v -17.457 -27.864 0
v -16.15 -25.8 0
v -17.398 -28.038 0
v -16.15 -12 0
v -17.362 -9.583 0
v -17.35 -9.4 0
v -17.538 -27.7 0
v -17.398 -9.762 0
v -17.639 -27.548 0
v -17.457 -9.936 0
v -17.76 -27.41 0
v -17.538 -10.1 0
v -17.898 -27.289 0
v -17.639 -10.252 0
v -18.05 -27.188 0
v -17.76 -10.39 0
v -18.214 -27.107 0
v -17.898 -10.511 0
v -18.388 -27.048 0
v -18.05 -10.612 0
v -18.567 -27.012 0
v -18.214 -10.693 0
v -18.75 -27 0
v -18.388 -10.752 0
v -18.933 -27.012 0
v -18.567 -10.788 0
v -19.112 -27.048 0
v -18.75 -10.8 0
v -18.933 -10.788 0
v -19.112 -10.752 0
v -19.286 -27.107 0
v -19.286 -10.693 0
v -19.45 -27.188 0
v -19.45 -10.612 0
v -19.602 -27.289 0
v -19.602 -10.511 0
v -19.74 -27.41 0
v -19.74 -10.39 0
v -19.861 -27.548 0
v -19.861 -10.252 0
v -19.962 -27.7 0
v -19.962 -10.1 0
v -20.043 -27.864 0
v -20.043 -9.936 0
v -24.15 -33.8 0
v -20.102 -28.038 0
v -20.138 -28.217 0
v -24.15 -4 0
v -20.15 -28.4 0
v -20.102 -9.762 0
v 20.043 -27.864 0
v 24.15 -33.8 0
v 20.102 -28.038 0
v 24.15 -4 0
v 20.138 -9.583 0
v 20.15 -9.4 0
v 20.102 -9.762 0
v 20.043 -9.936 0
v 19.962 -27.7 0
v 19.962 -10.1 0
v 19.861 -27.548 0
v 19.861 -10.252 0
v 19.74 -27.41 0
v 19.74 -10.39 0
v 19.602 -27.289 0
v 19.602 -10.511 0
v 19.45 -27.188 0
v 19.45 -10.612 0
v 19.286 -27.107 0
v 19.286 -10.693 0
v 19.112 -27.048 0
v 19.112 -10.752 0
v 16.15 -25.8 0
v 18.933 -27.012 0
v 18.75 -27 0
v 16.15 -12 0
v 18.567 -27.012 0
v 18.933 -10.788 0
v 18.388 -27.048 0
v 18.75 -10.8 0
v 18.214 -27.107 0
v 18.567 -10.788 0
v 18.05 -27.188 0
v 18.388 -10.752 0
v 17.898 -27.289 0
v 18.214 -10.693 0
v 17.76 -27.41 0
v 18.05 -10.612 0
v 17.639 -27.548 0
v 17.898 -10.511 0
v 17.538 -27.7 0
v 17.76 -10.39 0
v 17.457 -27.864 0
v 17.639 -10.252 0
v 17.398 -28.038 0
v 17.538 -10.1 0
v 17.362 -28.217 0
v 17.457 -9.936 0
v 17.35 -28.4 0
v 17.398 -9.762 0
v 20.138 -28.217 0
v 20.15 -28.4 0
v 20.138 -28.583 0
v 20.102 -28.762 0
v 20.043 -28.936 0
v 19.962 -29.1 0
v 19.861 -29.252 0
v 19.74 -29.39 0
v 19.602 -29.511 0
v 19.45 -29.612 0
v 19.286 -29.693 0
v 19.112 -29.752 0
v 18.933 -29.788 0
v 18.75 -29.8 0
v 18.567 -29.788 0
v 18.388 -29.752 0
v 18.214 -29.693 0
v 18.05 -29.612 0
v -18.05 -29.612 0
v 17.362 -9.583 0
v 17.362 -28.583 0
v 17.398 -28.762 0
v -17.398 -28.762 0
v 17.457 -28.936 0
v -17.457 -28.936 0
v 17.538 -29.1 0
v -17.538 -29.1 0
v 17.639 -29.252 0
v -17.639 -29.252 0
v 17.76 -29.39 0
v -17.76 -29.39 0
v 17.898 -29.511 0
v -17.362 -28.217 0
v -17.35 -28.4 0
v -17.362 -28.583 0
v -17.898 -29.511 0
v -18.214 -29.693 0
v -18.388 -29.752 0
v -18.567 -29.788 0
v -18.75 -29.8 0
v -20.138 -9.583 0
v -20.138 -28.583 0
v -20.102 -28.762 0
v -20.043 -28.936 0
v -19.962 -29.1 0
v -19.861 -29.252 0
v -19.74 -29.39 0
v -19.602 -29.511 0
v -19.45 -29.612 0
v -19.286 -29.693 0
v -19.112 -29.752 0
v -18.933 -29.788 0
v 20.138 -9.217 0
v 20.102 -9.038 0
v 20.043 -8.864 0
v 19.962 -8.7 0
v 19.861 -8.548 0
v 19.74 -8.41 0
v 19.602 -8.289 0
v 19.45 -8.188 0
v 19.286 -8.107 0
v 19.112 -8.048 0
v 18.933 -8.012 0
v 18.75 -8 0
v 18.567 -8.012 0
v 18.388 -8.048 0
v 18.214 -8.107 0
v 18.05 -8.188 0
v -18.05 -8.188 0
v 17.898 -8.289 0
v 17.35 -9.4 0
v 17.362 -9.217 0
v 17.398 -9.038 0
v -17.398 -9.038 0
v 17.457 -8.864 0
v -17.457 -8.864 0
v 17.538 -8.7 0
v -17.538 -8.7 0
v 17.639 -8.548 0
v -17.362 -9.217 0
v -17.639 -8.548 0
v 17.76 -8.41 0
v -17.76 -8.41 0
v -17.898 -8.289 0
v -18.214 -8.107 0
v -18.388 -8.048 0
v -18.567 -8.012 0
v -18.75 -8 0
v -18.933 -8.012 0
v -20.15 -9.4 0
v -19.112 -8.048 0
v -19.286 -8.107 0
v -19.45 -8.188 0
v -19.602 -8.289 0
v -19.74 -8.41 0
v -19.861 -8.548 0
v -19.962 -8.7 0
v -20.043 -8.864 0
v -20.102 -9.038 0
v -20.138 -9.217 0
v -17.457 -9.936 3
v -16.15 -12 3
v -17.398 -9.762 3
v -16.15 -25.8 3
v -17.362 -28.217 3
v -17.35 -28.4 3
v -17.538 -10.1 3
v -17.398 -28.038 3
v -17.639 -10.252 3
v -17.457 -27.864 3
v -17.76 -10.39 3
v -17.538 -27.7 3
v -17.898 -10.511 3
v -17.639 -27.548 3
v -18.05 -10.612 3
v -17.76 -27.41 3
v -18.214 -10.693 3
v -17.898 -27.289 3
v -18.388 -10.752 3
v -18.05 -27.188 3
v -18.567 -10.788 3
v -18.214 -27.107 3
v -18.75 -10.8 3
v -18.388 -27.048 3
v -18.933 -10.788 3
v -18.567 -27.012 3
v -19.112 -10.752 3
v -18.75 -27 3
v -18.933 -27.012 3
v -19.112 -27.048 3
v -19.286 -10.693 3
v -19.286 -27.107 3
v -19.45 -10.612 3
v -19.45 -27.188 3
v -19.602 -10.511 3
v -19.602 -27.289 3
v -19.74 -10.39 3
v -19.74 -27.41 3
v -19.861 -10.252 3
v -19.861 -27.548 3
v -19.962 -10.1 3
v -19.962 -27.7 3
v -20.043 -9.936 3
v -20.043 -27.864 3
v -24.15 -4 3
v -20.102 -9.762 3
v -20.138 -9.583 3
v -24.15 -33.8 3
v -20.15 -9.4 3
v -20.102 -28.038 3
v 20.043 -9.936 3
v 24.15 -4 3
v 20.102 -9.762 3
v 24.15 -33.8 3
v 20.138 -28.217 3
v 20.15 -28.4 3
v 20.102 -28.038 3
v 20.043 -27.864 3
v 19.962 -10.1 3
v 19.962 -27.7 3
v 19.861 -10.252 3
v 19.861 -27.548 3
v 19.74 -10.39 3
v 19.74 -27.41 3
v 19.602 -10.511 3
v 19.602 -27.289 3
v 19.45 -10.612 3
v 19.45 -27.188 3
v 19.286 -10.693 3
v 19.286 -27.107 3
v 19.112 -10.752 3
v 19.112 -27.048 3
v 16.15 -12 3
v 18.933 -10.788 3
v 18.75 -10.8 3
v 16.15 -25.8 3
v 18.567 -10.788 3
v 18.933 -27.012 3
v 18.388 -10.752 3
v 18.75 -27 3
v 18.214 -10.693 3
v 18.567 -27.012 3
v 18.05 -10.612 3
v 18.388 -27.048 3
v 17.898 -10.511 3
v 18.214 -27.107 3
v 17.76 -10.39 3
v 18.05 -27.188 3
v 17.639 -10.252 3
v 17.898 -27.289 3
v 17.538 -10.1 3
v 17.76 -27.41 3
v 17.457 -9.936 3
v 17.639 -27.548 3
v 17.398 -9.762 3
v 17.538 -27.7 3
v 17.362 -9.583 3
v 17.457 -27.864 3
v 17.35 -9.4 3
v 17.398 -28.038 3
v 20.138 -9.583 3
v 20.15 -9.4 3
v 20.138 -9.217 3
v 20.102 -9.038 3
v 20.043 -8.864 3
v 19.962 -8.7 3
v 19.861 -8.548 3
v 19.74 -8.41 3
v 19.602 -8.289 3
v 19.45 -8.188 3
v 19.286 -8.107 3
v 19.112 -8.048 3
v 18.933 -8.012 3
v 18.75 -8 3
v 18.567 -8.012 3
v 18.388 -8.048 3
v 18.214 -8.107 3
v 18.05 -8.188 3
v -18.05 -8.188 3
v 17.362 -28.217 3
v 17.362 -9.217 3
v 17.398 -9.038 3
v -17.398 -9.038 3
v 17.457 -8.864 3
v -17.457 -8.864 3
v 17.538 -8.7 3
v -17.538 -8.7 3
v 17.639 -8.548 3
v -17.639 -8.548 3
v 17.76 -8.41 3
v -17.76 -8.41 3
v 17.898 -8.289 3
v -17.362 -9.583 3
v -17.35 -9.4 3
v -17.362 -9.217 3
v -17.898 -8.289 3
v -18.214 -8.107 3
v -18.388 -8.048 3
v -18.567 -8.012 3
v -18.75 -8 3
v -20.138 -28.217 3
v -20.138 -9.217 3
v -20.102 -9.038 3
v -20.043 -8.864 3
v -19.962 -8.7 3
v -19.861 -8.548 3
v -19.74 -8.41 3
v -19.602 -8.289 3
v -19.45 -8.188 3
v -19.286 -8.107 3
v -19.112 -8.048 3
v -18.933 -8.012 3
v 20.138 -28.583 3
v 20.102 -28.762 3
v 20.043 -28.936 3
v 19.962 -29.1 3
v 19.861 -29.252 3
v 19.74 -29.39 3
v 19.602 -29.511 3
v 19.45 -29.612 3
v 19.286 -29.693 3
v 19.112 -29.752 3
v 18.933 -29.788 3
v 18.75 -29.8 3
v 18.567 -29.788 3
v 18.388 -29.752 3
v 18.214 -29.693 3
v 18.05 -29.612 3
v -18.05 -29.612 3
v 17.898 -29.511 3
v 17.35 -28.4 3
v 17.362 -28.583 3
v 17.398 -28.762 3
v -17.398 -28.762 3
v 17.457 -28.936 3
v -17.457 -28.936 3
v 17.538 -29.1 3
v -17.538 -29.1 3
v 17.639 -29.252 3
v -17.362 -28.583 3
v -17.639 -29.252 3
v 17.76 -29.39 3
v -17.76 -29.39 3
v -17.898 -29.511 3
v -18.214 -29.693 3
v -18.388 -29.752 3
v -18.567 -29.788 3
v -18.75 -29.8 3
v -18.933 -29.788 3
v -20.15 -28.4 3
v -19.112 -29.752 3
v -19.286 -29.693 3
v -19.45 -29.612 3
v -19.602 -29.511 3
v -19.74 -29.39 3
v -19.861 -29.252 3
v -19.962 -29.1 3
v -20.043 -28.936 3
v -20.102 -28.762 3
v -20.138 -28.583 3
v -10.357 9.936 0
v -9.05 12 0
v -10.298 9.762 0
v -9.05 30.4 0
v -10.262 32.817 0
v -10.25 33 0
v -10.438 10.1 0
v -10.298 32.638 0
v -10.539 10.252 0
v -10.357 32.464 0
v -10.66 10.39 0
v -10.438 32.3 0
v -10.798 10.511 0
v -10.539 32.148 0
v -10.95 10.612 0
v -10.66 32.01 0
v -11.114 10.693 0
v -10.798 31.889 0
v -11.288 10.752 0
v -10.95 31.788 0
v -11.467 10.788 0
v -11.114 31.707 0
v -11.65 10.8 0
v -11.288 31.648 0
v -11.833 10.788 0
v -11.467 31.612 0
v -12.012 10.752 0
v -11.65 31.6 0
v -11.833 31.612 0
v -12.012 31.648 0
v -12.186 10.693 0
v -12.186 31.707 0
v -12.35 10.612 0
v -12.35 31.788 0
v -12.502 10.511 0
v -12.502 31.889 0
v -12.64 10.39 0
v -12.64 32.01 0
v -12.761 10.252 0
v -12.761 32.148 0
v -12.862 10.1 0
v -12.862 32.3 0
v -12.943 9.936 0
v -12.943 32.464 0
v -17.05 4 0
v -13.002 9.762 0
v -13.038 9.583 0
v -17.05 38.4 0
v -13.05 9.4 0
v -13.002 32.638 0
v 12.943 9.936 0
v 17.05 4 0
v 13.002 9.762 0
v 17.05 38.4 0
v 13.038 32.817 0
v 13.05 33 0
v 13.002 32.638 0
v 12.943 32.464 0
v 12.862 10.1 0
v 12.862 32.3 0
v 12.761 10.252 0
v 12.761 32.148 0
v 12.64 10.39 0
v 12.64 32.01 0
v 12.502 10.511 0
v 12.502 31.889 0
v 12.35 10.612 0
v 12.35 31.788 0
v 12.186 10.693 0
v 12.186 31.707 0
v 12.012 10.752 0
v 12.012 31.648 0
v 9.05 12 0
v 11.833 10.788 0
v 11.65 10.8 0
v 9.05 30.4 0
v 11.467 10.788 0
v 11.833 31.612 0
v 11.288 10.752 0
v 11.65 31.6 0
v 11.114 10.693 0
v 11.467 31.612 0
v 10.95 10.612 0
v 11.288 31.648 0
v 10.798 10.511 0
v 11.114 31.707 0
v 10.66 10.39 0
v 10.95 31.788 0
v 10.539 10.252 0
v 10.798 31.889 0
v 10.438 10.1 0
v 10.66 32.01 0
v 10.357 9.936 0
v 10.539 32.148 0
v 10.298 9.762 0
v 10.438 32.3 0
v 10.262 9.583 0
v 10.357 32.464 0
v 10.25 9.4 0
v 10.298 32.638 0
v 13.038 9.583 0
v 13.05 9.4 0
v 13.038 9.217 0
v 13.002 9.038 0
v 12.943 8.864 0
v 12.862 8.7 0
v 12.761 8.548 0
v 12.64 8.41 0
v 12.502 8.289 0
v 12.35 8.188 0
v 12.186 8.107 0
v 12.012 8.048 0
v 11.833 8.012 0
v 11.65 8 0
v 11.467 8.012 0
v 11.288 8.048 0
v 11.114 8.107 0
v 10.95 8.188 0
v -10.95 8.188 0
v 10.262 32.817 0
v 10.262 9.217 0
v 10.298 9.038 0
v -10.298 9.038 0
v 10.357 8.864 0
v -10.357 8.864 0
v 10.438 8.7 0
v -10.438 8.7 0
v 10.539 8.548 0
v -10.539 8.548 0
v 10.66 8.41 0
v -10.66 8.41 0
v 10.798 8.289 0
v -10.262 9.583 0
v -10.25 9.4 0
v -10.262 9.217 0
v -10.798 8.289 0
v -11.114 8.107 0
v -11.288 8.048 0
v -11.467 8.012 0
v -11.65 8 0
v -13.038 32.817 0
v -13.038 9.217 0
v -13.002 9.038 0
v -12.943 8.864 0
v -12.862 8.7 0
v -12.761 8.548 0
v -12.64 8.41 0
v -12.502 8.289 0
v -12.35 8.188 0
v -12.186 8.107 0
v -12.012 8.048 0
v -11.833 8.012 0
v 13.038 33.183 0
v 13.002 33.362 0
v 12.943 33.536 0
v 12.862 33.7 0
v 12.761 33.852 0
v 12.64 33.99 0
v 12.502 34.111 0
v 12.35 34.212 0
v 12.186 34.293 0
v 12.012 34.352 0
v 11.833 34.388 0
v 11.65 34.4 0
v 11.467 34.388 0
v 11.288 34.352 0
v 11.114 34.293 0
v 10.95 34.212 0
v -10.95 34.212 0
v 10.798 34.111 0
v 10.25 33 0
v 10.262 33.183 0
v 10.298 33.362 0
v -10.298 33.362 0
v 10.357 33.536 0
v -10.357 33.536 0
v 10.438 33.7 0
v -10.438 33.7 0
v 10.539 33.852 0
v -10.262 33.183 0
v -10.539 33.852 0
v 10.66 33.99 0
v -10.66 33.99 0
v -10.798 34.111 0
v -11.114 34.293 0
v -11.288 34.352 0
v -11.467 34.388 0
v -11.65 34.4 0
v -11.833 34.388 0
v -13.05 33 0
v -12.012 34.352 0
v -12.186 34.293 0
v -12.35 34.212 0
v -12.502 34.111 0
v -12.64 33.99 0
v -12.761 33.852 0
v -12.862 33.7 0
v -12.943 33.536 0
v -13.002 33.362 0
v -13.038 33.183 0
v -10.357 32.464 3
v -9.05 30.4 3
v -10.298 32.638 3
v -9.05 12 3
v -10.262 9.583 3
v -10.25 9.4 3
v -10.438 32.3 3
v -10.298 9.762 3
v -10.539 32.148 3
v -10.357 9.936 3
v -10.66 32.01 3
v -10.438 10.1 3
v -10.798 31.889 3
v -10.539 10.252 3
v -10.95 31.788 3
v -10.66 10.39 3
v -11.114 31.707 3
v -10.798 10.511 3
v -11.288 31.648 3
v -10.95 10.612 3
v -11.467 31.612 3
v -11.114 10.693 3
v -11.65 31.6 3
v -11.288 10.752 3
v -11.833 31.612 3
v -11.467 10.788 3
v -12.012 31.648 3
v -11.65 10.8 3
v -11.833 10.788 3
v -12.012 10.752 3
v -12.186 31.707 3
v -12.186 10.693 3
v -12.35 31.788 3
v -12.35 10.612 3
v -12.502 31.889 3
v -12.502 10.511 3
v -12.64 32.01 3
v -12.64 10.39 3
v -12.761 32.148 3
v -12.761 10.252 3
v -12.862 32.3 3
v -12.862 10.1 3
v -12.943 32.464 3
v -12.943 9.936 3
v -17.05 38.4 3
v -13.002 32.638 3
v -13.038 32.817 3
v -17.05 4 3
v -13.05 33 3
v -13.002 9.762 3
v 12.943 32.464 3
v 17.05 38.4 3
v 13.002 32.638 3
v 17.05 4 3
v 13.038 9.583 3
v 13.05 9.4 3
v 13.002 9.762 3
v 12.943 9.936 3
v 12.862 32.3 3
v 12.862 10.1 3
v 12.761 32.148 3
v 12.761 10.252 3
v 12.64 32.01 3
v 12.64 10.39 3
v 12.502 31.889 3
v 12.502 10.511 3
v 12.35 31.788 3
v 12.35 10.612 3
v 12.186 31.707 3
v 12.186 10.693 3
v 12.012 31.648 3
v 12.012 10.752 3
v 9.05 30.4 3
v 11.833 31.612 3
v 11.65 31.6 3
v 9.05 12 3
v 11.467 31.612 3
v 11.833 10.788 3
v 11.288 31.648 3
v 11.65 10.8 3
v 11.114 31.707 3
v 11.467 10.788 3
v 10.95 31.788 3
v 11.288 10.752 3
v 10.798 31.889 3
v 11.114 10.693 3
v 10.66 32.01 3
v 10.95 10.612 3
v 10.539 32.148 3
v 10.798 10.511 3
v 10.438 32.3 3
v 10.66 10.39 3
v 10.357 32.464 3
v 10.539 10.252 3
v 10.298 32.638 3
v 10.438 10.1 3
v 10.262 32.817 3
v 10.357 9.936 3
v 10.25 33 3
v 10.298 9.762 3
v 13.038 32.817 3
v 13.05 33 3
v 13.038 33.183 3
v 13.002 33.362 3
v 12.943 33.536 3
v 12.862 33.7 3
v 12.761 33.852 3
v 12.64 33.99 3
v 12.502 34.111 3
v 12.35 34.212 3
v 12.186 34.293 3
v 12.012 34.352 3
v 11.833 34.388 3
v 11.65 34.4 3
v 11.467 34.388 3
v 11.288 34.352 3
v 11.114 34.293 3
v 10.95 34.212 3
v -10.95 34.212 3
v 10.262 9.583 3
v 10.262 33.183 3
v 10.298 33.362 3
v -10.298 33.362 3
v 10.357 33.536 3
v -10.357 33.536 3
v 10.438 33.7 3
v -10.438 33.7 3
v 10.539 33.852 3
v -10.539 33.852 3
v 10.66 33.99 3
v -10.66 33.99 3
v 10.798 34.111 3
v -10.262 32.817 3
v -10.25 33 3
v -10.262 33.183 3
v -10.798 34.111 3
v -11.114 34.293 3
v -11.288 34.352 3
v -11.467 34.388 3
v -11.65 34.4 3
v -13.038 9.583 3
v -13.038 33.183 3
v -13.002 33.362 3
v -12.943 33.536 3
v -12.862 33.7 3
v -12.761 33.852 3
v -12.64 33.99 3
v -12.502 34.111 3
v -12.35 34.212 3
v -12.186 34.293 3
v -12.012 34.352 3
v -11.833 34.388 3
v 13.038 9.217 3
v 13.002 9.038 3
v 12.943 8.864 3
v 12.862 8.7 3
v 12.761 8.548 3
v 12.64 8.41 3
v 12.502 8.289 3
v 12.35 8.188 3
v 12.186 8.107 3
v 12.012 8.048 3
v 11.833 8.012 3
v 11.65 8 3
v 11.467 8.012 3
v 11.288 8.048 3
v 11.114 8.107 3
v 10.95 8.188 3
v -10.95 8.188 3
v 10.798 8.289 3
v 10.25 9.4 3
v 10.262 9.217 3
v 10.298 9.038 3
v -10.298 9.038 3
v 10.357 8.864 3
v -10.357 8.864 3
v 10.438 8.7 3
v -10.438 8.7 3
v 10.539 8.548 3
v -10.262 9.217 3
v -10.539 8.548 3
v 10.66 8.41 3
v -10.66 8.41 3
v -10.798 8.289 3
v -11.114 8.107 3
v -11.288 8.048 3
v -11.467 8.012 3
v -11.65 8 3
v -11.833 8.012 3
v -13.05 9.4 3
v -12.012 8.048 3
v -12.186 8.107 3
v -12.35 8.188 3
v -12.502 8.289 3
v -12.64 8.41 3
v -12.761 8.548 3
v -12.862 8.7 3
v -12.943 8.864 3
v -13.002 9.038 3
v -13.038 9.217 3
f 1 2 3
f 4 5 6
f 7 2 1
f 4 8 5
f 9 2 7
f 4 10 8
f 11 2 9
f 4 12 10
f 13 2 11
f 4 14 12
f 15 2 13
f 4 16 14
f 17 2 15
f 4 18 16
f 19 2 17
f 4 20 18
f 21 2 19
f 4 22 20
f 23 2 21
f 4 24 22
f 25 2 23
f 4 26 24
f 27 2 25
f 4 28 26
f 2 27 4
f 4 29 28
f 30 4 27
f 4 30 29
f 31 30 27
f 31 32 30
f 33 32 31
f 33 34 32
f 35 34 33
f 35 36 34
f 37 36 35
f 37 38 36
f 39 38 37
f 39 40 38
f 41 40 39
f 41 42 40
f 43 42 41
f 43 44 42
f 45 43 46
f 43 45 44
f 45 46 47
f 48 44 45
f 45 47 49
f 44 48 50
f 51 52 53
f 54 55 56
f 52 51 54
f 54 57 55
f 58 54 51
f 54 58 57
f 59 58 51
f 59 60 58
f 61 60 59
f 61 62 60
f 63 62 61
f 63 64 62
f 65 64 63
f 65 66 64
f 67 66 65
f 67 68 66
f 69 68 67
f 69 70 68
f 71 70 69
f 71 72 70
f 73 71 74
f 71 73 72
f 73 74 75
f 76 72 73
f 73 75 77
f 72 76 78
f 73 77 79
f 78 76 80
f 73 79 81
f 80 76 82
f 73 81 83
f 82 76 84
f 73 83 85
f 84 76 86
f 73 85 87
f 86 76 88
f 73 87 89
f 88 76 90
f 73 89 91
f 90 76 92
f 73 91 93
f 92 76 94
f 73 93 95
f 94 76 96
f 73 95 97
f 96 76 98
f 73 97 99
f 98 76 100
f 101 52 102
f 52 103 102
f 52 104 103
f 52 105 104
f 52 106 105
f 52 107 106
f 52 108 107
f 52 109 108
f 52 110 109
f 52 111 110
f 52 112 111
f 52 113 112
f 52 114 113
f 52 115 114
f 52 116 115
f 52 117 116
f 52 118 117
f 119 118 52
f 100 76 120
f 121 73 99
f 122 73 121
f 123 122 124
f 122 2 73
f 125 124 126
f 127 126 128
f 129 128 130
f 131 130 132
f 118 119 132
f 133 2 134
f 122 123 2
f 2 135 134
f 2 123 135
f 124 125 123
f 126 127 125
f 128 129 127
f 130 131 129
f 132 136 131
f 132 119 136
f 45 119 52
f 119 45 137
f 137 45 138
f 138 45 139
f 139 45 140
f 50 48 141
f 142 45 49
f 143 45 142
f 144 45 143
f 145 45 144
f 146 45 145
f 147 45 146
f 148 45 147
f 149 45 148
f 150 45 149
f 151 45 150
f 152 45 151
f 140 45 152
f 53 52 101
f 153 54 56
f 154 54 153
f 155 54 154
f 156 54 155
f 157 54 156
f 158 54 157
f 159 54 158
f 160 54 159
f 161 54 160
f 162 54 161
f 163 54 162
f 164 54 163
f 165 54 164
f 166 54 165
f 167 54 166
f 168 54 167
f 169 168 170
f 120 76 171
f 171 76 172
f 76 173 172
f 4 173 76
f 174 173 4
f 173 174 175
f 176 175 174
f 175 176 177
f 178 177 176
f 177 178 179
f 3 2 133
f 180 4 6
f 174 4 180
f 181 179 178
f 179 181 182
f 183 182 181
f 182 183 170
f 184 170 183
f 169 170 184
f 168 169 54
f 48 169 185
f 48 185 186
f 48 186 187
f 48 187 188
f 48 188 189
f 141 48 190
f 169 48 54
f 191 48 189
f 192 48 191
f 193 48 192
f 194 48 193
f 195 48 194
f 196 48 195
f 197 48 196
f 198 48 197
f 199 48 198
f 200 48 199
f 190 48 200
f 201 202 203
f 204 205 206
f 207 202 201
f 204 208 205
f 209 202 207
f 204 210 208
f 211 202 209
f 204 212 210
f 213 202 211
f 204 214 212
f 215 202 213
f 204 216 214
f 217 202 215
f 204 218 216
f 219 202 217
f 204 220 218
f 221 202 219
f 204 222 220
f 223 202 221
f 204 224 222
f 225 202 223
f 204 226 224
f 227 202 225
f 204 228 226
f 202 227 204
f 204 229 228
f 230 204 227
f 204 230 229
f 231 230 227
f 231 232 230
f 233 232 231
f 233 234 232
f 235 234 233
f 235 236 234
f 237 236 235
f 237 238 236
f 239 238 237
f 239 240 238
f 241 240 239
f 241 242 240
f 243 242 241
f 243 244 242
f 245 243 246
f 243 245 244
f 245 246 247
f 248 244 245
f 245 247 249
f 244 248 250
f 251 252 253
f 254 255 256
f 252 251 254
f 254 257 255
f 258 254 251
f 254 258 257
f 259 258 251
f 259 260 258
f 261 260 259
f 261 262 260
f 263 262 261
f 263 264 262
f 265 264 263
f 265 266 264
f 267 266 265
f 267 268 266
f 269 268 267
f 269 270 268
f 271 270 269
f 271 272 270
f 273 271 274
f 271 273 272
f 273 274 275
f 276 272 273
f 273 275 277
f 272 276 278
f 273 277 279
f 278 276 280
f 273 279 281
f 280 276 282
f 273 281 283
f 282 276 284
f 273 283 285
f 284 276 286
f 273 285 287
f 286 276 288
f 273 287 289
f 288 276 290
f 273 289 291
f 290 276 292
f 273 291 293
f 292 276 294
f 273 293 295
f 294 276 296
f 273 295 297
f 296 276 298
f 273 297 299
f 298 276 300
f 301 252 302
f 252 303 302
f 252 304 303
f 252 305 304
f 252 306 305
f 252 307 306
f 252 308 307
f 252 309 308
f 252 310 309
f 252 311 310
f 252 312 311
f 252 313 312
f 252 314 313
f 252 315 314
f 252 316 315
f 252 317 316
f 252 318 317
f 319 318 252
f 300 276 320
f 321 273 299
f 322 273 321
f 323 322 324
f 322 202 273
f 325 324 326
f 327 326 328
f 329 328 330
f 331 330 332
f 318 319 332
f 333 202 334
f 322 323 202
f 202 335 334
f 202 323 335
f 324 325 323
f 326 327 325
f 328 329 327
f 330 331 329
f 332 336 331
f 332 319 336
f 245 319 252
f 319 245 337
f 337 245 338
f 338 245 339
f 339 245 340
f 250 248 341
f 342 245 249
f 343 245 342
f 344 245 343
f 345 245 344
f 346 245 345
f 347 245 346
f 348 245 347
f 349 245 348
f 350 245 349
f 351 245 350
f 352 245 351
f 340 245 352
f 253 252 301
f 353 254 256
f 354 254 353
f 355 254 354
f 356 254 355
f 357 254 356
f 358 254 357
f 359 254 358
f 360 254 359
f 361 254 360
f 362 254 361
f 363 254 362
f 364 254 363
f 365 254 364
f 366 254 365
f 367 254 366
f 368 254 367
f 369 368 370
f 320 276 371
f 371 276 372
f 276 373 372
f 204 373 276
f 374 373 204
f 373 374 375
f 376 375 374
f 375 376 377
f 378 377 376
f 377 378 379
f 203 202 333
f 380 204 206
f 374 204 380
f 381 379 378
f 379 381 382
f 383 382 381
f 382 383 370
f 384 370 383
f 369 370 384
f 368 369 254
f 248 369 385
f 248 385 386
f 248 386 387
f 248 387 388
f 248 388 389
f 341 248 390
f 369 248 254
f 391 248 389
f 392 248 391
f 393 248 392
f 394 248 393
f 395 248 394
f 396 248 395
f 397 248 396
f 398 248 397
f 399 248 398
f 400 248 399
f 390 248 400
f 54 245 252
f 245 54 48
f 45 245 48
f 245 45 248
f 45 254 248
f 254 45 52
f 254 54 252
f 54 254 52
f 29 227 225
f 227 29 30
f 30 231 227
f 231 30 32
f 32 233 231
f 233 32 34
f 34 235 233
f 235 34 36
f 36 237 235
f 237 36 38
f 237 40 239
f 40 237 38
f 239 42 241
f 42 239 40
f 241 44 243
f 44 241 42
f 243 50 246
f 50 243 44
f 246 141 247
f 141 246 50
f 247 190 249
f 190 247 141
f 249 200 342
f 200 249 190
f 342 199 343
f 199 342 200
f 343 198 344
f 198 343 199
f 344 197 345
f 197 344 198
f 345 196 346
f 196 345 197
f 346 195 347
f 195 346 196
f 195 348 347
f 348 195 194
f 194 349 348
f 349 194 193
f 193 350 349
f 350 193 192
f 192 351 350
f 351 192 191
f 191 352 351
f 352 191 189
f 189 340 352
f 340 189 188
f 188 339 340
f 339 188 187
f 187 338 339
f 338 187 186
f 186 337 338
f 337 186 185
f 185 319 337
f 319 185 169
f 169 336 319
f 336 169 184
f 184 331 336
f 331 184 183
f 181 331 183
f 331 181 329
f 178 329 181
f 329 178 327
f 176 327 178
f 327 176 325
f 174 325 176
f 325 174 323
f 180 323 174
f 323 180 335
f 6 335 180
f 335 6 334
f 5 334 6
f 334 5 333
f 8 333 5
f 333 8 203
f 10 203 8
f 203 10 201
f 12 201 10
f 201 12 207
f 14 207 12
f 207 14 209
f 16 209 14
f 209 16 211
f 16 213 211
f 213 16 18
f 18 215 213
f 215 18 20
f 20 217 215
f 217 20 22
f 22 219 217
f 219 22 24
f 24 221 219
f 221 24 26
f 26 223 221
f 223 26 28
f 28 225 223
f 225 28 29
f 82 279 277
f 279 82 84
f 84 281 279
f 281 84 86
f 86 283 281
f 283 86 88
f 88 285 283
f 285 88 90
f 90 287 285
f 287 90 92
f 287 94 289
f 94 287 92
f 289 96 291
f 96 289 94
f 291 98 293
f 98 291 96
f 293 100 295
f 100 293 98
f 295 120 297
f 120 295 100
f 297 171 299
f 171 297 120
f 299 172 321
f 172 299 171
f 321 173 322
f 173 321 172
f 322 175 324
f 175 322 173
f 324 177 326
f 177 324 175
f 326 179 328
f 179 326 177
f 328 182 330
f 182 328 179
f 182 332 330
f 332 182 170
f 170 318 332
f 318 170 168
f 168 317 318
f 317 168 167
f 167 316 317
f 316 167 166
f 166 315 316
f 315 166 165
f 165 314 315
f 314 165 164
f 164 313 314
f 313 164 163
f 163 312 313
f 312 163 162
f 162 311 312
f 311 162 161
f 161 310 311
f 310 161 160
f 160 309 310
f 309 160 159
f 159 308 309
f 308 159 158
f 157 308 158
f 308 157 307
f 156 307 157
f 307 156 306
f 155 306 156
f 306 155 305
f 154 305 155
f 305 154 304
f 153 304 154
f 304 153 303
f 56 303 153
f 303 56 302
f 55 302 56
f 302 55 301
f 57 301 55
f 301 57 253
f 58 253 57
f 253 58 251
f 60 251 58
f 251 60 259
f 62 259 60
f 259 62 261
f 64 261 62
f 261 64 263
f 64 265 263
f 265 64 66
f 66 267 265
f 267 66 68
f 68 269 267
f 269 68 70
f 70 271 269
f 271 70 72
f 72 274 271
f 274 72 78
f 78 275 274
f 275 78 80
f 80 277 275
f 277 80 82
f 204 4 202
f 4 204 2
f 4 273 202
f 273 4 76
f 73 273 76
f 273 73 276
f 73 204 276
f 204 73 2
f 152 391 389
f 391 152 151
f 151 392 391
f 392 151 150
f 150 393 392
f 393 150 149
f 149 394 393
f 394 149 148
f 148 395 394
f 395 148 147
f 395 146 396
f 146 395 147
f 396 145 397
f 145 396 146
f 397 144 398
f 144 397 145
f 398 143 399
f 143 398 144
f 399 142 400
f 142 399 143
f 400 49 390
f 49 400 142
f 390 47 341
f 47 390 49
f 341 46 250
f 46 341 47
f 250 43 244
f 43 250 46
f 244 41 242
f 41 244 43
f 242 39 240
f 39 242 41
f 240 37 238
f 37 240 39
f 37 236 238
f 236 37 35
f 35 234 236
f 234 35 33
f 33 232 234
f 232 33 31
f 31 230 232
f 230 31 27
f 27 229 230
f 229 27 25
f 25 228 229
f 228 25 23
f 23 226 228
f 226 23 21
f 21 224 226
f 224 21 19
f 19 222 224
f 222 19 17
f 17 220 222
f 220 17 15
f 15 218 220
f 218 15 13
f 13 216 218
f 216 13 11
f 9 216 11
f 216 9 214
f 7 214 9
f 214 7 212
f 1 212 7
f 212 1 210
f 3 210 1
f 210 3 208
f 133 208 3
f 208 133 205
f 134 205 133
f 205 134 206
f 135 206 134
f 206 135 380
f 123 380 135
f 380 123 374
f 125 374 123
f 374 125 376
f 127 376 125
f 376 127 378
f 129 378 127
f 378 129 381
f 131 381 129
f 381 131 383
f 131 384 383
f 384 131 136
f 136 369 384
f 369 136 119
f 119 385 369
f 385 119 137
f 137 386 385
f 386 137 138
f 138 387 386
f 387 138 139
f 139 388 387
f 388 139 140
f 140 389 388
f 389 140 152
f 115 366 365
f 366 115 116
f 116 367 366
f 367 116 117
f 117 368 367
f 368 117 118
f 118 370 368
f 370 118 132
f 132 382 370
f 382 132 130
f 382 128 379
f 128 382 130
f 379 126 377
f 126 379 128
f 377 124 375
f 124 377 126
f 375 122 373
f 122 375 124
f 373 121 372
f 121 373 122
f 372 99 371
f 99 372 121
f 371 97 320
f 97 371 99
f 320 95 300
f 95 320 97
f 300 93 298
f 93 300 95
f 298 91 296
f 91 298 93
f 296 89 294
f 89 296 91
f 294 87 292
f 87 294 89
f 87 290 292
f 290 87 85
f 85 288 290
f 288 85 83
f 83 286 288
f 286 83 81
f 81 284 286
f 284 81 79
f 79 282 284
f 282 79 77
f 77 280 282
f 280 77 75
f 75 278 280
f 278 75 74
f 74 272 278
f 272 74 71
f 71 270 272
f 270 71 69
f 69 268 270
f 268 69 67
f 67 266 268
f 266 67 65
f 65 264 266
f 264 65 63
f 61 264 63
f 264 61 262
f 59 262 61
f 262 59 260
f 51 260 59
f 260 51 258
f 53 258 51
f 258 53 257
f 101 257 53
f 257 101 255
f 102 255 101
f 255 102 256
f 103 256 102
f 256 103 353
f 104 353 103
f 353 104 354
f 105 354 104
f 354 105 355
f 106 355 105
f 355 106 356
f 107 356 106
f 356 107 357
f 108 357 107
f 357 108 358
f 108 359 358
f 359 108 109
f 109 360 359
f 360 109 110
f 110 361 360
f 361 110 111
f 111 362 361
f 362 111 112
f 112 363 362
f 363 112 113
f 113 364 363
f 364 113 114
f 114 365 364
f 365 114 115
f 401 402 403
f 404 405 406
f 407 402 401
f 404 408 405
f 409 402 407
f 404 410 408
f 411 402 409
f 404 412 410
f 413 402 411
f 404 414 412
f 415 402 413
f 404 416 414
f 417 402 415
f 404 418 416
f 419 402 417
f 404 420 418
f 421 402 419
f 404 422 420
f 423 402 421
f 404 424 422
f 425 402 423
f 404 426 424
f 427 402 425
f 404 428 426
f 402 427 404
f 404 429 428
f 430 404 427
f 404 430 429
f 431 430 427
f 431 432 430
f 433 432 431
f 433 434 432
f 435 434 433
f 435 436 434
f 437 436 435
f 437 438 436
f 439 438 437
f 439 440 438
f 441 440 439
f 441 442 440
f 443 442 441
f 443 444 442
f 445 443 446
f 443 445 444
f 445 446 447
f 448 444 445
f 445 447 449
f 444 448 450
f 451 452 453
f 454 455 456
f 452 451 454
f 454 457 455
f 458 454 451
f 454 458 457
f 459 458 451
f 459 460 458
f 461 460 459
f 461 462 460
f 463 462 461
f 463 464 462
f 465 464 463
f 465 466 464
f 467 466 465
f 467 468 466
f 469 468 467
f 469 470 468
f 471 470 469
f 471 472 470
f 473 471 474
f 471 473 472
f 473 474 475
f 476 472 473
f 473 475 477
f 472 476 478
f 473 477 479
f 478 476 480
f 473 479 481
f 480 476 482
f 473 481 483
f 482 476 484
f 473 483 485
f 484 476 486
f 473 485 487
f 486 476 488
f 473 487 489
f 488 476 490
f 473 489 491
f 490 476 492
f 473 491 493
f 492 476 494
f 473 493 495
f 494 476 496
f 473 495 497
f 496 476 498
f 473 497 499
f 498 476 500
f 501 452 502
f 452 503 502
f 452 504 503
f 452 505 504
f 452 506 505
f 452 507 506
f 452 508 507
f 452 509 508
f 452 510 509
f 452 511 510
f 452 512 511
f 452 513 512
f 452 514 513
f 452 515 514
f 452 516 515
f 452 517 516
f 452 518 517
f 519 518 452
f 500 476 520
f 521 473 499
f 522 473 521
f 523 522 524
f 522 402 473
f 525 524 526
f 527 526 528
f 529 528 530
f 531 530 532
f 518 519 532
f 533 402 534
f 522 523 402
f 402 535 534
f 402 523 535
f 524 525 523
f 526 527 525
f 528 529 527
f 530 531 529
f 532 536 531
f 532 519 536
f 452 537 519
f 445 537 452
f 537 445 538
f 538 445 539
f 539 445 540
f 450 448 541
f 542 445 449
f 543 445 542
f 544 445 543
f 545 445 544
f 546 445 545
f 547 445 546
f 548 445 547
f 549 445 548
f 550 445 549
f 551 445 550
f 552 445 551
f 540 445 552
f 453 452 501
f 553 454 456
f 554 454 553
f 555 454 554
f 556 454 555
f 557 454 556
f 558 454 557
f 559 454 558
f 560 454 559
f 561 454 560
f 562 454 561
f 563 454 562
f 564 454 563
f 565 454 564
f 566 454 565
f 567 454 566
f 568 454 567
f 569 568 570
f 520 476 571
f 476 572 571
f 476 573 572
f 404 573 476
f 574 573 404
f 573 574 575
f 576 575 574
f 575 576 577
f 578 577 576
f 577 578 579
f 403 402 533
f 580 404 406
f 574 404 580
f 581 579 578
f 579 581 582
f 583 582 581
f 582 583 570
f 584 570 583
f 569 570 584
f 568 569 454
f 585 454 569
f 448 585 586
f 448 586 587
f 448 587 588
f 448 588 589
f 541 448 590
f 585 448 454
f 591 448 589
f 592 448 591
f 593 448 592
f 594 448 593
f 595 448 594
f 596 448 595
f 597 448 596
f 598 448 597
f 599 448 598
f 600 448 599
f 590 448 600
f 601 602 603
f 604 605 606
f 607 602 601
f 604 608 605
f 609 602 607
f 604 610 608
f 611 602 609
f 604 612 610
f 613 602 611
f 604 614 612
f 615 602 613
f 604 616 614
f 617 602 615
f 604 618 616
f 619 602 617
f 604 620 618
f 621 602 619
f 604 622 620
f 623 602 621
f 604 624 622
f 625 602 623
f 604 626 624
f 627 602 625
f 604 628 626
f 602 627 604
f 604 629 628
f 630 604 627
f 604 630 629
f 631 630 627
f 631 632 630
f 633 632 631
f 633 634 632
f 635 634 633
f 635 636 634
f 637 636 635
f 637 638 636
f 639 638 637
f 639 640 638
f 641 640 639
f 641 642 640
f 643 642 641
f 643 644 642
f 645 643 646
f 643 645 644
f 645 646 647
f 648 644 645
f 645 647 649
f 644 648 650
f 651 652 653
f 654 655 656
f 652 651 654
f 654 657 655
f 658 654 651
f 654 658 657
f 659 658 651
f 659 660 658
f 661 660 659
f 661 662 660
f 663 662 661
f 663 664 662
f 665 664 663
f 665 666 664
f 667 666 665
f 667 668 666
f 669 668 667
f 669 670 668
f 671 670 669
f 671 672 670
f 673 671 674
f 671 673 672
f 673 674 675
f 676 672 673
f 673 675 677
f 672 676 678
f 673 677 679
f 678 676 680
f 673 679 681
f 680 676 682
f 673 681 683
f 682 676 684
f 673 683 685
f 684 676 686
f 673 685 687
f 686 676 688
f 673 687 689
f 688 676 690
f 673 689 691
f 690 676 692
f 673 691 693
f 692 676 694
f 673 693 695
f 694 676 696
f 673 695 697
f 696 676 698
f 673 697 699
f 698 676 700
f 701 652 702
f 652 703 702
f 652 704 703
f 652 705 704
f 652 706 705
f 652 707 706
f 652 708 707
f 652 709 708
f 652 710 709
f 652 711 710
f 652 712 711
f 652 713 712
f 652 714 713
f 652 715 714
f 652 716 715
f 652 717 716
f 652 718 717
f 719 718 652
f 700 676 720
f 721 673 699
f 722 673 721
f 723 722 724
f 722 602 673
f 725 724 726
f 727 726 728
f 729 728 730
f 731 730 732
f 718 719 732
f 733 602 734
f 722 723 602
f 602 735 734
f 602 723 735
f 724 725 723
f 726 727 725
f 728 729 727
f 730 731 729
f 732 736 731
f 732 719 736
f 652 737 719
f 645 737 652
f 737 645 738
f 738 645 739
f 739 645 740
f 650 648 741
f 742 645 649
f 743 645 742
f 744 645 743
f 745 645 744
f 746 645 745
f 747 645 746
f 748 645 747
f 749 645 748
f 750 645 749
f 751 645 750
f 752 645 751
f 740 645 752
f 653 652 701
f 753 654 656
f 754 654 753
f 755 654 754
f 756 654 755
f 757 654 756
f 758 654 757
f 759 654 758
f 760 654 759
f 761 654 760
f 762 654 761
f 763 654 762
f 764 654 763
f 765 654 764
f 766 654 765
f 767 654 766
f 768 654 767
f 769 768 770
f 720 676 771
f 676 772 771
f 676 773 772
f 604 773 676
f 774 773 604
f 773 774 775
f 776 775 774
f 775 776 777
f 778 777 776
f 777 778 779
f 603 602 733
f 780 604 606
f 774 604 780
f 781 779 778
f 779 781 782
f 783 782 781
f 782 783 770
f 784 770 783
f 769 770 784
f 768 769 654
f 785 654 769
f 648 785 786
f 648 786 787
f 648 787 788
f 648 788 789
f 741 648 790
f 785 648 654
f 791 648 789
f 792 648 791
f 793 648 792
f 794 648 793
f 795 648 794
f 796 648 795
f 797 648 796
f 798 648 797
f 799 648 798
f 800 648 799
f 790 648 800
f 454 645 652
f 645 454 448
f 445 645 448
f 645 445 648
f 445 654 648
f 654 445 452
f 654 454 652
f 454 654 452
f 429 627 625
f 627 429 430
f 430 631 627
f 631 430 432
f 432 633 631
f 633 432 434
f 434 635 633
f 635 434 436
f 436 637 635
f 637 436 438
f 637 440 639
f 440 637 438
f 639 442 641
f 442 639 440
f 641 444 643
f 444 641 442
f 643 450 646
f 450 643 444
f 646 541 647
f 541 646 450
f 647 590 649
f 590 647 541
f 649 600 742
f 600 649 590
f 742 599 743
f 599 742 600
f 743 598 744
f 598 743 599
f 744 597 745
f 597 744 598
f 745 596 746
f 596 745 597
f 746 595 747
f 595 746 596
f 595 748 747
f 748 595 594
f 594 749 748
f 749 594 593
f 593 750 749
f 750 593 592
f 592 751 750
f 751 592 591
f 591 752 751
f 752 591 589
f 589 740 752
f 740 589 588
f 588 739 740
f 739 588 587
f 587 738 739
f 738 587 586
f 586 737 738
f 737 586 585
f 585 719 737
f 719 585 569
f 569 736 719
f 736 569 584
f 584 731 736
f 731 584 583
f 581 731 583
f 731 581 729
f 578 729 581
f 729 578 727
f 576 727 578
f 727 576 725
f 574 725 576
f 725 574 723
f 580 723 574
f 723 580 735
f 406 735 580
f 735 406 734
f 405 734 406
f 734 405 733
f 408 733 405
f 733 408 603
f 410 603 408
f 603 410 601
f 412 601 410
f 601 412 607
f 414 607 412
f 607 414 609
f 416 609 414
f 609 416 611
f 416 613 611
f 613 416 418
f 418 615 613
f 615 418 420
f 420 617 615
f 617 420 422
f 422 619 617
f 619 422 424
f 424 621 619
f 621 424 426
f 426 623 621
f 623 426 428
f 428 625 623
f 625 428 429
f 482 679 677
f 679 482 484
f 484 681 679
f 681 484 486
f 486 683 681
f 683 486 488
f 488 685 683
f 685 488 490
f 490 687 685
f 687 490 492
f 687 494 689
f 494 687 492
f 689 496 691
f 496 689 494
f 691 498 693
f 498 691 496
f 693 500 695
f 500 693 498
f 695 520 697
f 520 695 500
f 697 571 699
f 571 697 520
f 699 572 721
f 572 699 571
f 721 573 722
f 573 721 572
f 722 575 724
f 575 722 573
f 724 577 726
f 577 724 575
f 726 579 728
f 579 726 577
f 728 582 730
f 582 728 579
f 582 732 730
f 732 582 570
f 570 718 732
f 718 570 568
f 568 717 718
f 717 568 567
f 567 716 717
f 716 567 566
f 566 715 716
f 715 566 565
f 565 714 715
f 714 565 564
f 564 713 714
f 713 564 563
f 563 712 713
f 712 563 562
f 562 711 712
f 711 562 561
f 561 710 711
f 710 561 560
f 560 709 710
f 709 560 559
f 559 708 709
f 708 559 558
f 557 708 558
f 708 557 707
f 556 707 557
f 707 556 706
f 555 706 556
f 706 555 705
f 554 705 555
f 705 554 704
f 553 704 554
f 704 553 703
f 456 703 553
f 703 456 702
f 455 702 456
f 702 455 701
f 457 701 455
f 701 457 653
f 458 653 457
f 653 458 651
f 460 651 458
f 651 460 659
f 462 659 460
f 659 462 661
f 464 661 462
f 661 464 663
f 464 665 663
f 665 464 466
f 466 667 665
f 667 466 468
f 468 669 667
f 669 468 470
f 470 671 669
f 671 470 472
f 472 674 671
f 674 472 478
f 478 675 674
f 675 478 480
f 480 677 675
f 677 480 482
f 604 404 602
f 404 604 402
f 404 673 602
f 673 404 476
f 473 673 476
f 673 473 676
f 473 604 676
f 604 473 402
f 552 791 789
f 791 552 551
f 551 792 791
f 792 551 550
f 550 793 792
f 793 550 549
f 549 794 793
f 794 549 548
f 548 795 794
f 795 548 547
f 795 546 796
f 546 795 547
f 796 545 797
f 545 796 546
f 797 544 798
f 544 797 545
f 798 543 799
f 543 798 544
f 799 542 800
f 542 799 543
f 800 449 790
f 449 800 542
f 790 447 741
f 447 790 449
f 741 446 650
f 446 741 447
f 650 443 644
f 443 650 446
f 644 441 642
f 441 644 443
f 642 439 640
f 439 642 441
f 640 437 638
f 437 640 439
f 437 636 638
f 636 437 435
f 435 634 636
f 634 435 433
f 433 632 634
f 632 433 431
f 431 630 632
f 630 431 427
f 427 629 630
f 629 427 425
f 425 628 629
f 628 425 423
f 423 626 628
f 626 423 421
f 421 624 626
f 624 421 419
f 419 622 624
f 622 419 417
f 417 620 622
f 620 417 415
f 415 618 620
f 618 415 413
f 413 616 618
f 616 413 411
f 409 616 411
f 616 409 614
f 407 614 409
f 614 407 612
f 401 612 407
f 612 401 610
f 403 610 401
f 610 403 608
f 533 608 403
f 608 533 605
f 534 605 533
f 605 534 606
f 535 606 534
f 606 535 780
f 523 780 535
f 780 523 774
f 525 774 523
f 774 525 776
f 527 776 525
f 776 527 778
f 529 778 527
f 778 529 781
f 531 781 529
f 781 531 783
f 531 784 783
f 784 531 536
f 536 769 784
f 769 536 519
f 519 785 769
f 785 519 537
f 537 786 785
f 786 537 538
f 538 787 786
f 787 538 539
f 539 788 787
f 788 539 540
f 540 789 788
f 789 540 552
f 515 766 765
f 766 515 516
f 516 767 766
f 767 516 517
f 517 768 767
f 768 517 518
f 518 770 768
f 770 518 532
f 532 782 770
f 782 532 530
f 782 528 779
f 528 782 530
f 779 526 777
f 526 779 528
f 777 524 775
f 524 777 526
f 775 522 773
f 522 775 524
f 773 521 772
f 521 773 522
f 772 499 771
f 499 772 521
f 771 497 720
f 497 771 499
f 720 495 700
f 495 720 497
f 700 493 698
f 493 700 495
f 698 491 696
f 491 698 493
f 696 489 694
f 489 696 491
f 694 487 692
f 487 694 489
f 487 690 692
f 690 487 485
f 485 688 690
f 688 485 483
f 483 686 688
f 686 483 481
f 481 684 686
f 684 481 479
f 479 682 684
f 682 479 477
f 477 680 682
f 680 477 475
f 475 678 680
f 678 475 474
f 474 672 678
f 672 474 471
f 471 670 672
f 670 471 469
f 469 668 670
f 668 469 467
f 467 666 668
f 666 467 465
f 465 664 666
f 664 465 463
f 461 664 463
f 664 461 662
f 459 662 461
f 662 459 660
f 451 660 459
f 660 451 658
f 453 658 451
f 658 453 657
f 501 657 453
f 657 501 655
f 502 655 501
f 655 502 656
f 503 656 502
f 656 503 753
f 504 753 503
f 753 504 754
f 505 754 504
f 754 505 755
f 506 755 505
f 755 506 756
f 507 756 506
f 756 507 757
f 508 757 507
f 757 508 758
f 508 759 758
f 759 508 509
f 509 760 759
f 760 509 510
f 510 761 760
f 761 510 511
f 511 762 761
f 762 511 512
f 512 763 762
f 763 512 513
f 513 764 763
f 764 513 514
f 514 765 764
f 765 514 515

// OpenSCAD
// Tier fit gauge: two flat plates with square, parallel sides, one per display module.
// Every size is a parameter, so the plate's width and length can be calipered against the
// numbers below and the holes checked against the module itself. Not the photocell.
// The centre is cut out, leaving a band `rim` wide, so the board shows through. Print flat.

/* [What to print] */
which = "both";        // [both, seg, oled]

/* [Segment display: TM1637 board, holes calipered by the owner (parts.md)] */
seg_hole_dx = 37.5;    // hole centre to centre, along the board's length
seg_hole_dy = 19;      // across the board
/* [OLED: SSD1306 0.96", generic drawing, caliper the one in hand] */
oled_hole_dx = 23.3;
oled_hole_dy = 23.6;

/* [Gauge] */
hole_d = 2.8;          // M2.5 clearance; the tier uses 2.8
margin = 4;            // plate edge beyond each hole's outer edge
thickness = 3;         // thick enough to stay stiff in the hand
rim = 8;               // width of the solid band round the plate; the centre inside it is cut out (0 = solid)
gap = 8;               // between the two plates when both are printed

/* [Hidden] */
$fn = 48;
// Plate size is the hole centre spacing plus 2 * (margin + hole_d / 2): the plate edge sits
// `margin` outside each hole's outer edge, so outer-edge-to-outer-edge of the holes is
// spacing + hole_d, and the plate is that plus 2 * margin.
function plate_w(dx) = dx + hole_d + 2 * margin;
function plate_l(dy) = dy + hole_d + 2 * margin;

module plate(dx, dy) {
    linear_extrude(thickness) difference() {
        square([plate_w(dx), plate_l(dy)], center = true);
        if (rim > 0) square([plate_w(dx) - 2 * rim, plate_l(dy) - 2 * rim], center = true);
        for (sx = [-1, 1], sy = [-1, 1]) translate([sx * dx / 2, sy * dy / 2]) circle(d = hole_d);
    }
}

sw = plate_w(seg_hole_dx);
ow = plate_w(oled_hole_dx);
if (which == "seg") plate(seg_hole_dx, seg_hole_dy);
else if (which == "oled") plate(oled_hole_dx, oled_hole_dy);
else {
    translate([0, -(plate_l(seg_hole_dy) + gap) / 2 ]) plate(seg_hole_dx, seg_hole_dy);
    translate([0, (plate_l(oled_hole_dy) + gap) / 2]) plate(oled_hole_dx, oled_hole_dy);
}
